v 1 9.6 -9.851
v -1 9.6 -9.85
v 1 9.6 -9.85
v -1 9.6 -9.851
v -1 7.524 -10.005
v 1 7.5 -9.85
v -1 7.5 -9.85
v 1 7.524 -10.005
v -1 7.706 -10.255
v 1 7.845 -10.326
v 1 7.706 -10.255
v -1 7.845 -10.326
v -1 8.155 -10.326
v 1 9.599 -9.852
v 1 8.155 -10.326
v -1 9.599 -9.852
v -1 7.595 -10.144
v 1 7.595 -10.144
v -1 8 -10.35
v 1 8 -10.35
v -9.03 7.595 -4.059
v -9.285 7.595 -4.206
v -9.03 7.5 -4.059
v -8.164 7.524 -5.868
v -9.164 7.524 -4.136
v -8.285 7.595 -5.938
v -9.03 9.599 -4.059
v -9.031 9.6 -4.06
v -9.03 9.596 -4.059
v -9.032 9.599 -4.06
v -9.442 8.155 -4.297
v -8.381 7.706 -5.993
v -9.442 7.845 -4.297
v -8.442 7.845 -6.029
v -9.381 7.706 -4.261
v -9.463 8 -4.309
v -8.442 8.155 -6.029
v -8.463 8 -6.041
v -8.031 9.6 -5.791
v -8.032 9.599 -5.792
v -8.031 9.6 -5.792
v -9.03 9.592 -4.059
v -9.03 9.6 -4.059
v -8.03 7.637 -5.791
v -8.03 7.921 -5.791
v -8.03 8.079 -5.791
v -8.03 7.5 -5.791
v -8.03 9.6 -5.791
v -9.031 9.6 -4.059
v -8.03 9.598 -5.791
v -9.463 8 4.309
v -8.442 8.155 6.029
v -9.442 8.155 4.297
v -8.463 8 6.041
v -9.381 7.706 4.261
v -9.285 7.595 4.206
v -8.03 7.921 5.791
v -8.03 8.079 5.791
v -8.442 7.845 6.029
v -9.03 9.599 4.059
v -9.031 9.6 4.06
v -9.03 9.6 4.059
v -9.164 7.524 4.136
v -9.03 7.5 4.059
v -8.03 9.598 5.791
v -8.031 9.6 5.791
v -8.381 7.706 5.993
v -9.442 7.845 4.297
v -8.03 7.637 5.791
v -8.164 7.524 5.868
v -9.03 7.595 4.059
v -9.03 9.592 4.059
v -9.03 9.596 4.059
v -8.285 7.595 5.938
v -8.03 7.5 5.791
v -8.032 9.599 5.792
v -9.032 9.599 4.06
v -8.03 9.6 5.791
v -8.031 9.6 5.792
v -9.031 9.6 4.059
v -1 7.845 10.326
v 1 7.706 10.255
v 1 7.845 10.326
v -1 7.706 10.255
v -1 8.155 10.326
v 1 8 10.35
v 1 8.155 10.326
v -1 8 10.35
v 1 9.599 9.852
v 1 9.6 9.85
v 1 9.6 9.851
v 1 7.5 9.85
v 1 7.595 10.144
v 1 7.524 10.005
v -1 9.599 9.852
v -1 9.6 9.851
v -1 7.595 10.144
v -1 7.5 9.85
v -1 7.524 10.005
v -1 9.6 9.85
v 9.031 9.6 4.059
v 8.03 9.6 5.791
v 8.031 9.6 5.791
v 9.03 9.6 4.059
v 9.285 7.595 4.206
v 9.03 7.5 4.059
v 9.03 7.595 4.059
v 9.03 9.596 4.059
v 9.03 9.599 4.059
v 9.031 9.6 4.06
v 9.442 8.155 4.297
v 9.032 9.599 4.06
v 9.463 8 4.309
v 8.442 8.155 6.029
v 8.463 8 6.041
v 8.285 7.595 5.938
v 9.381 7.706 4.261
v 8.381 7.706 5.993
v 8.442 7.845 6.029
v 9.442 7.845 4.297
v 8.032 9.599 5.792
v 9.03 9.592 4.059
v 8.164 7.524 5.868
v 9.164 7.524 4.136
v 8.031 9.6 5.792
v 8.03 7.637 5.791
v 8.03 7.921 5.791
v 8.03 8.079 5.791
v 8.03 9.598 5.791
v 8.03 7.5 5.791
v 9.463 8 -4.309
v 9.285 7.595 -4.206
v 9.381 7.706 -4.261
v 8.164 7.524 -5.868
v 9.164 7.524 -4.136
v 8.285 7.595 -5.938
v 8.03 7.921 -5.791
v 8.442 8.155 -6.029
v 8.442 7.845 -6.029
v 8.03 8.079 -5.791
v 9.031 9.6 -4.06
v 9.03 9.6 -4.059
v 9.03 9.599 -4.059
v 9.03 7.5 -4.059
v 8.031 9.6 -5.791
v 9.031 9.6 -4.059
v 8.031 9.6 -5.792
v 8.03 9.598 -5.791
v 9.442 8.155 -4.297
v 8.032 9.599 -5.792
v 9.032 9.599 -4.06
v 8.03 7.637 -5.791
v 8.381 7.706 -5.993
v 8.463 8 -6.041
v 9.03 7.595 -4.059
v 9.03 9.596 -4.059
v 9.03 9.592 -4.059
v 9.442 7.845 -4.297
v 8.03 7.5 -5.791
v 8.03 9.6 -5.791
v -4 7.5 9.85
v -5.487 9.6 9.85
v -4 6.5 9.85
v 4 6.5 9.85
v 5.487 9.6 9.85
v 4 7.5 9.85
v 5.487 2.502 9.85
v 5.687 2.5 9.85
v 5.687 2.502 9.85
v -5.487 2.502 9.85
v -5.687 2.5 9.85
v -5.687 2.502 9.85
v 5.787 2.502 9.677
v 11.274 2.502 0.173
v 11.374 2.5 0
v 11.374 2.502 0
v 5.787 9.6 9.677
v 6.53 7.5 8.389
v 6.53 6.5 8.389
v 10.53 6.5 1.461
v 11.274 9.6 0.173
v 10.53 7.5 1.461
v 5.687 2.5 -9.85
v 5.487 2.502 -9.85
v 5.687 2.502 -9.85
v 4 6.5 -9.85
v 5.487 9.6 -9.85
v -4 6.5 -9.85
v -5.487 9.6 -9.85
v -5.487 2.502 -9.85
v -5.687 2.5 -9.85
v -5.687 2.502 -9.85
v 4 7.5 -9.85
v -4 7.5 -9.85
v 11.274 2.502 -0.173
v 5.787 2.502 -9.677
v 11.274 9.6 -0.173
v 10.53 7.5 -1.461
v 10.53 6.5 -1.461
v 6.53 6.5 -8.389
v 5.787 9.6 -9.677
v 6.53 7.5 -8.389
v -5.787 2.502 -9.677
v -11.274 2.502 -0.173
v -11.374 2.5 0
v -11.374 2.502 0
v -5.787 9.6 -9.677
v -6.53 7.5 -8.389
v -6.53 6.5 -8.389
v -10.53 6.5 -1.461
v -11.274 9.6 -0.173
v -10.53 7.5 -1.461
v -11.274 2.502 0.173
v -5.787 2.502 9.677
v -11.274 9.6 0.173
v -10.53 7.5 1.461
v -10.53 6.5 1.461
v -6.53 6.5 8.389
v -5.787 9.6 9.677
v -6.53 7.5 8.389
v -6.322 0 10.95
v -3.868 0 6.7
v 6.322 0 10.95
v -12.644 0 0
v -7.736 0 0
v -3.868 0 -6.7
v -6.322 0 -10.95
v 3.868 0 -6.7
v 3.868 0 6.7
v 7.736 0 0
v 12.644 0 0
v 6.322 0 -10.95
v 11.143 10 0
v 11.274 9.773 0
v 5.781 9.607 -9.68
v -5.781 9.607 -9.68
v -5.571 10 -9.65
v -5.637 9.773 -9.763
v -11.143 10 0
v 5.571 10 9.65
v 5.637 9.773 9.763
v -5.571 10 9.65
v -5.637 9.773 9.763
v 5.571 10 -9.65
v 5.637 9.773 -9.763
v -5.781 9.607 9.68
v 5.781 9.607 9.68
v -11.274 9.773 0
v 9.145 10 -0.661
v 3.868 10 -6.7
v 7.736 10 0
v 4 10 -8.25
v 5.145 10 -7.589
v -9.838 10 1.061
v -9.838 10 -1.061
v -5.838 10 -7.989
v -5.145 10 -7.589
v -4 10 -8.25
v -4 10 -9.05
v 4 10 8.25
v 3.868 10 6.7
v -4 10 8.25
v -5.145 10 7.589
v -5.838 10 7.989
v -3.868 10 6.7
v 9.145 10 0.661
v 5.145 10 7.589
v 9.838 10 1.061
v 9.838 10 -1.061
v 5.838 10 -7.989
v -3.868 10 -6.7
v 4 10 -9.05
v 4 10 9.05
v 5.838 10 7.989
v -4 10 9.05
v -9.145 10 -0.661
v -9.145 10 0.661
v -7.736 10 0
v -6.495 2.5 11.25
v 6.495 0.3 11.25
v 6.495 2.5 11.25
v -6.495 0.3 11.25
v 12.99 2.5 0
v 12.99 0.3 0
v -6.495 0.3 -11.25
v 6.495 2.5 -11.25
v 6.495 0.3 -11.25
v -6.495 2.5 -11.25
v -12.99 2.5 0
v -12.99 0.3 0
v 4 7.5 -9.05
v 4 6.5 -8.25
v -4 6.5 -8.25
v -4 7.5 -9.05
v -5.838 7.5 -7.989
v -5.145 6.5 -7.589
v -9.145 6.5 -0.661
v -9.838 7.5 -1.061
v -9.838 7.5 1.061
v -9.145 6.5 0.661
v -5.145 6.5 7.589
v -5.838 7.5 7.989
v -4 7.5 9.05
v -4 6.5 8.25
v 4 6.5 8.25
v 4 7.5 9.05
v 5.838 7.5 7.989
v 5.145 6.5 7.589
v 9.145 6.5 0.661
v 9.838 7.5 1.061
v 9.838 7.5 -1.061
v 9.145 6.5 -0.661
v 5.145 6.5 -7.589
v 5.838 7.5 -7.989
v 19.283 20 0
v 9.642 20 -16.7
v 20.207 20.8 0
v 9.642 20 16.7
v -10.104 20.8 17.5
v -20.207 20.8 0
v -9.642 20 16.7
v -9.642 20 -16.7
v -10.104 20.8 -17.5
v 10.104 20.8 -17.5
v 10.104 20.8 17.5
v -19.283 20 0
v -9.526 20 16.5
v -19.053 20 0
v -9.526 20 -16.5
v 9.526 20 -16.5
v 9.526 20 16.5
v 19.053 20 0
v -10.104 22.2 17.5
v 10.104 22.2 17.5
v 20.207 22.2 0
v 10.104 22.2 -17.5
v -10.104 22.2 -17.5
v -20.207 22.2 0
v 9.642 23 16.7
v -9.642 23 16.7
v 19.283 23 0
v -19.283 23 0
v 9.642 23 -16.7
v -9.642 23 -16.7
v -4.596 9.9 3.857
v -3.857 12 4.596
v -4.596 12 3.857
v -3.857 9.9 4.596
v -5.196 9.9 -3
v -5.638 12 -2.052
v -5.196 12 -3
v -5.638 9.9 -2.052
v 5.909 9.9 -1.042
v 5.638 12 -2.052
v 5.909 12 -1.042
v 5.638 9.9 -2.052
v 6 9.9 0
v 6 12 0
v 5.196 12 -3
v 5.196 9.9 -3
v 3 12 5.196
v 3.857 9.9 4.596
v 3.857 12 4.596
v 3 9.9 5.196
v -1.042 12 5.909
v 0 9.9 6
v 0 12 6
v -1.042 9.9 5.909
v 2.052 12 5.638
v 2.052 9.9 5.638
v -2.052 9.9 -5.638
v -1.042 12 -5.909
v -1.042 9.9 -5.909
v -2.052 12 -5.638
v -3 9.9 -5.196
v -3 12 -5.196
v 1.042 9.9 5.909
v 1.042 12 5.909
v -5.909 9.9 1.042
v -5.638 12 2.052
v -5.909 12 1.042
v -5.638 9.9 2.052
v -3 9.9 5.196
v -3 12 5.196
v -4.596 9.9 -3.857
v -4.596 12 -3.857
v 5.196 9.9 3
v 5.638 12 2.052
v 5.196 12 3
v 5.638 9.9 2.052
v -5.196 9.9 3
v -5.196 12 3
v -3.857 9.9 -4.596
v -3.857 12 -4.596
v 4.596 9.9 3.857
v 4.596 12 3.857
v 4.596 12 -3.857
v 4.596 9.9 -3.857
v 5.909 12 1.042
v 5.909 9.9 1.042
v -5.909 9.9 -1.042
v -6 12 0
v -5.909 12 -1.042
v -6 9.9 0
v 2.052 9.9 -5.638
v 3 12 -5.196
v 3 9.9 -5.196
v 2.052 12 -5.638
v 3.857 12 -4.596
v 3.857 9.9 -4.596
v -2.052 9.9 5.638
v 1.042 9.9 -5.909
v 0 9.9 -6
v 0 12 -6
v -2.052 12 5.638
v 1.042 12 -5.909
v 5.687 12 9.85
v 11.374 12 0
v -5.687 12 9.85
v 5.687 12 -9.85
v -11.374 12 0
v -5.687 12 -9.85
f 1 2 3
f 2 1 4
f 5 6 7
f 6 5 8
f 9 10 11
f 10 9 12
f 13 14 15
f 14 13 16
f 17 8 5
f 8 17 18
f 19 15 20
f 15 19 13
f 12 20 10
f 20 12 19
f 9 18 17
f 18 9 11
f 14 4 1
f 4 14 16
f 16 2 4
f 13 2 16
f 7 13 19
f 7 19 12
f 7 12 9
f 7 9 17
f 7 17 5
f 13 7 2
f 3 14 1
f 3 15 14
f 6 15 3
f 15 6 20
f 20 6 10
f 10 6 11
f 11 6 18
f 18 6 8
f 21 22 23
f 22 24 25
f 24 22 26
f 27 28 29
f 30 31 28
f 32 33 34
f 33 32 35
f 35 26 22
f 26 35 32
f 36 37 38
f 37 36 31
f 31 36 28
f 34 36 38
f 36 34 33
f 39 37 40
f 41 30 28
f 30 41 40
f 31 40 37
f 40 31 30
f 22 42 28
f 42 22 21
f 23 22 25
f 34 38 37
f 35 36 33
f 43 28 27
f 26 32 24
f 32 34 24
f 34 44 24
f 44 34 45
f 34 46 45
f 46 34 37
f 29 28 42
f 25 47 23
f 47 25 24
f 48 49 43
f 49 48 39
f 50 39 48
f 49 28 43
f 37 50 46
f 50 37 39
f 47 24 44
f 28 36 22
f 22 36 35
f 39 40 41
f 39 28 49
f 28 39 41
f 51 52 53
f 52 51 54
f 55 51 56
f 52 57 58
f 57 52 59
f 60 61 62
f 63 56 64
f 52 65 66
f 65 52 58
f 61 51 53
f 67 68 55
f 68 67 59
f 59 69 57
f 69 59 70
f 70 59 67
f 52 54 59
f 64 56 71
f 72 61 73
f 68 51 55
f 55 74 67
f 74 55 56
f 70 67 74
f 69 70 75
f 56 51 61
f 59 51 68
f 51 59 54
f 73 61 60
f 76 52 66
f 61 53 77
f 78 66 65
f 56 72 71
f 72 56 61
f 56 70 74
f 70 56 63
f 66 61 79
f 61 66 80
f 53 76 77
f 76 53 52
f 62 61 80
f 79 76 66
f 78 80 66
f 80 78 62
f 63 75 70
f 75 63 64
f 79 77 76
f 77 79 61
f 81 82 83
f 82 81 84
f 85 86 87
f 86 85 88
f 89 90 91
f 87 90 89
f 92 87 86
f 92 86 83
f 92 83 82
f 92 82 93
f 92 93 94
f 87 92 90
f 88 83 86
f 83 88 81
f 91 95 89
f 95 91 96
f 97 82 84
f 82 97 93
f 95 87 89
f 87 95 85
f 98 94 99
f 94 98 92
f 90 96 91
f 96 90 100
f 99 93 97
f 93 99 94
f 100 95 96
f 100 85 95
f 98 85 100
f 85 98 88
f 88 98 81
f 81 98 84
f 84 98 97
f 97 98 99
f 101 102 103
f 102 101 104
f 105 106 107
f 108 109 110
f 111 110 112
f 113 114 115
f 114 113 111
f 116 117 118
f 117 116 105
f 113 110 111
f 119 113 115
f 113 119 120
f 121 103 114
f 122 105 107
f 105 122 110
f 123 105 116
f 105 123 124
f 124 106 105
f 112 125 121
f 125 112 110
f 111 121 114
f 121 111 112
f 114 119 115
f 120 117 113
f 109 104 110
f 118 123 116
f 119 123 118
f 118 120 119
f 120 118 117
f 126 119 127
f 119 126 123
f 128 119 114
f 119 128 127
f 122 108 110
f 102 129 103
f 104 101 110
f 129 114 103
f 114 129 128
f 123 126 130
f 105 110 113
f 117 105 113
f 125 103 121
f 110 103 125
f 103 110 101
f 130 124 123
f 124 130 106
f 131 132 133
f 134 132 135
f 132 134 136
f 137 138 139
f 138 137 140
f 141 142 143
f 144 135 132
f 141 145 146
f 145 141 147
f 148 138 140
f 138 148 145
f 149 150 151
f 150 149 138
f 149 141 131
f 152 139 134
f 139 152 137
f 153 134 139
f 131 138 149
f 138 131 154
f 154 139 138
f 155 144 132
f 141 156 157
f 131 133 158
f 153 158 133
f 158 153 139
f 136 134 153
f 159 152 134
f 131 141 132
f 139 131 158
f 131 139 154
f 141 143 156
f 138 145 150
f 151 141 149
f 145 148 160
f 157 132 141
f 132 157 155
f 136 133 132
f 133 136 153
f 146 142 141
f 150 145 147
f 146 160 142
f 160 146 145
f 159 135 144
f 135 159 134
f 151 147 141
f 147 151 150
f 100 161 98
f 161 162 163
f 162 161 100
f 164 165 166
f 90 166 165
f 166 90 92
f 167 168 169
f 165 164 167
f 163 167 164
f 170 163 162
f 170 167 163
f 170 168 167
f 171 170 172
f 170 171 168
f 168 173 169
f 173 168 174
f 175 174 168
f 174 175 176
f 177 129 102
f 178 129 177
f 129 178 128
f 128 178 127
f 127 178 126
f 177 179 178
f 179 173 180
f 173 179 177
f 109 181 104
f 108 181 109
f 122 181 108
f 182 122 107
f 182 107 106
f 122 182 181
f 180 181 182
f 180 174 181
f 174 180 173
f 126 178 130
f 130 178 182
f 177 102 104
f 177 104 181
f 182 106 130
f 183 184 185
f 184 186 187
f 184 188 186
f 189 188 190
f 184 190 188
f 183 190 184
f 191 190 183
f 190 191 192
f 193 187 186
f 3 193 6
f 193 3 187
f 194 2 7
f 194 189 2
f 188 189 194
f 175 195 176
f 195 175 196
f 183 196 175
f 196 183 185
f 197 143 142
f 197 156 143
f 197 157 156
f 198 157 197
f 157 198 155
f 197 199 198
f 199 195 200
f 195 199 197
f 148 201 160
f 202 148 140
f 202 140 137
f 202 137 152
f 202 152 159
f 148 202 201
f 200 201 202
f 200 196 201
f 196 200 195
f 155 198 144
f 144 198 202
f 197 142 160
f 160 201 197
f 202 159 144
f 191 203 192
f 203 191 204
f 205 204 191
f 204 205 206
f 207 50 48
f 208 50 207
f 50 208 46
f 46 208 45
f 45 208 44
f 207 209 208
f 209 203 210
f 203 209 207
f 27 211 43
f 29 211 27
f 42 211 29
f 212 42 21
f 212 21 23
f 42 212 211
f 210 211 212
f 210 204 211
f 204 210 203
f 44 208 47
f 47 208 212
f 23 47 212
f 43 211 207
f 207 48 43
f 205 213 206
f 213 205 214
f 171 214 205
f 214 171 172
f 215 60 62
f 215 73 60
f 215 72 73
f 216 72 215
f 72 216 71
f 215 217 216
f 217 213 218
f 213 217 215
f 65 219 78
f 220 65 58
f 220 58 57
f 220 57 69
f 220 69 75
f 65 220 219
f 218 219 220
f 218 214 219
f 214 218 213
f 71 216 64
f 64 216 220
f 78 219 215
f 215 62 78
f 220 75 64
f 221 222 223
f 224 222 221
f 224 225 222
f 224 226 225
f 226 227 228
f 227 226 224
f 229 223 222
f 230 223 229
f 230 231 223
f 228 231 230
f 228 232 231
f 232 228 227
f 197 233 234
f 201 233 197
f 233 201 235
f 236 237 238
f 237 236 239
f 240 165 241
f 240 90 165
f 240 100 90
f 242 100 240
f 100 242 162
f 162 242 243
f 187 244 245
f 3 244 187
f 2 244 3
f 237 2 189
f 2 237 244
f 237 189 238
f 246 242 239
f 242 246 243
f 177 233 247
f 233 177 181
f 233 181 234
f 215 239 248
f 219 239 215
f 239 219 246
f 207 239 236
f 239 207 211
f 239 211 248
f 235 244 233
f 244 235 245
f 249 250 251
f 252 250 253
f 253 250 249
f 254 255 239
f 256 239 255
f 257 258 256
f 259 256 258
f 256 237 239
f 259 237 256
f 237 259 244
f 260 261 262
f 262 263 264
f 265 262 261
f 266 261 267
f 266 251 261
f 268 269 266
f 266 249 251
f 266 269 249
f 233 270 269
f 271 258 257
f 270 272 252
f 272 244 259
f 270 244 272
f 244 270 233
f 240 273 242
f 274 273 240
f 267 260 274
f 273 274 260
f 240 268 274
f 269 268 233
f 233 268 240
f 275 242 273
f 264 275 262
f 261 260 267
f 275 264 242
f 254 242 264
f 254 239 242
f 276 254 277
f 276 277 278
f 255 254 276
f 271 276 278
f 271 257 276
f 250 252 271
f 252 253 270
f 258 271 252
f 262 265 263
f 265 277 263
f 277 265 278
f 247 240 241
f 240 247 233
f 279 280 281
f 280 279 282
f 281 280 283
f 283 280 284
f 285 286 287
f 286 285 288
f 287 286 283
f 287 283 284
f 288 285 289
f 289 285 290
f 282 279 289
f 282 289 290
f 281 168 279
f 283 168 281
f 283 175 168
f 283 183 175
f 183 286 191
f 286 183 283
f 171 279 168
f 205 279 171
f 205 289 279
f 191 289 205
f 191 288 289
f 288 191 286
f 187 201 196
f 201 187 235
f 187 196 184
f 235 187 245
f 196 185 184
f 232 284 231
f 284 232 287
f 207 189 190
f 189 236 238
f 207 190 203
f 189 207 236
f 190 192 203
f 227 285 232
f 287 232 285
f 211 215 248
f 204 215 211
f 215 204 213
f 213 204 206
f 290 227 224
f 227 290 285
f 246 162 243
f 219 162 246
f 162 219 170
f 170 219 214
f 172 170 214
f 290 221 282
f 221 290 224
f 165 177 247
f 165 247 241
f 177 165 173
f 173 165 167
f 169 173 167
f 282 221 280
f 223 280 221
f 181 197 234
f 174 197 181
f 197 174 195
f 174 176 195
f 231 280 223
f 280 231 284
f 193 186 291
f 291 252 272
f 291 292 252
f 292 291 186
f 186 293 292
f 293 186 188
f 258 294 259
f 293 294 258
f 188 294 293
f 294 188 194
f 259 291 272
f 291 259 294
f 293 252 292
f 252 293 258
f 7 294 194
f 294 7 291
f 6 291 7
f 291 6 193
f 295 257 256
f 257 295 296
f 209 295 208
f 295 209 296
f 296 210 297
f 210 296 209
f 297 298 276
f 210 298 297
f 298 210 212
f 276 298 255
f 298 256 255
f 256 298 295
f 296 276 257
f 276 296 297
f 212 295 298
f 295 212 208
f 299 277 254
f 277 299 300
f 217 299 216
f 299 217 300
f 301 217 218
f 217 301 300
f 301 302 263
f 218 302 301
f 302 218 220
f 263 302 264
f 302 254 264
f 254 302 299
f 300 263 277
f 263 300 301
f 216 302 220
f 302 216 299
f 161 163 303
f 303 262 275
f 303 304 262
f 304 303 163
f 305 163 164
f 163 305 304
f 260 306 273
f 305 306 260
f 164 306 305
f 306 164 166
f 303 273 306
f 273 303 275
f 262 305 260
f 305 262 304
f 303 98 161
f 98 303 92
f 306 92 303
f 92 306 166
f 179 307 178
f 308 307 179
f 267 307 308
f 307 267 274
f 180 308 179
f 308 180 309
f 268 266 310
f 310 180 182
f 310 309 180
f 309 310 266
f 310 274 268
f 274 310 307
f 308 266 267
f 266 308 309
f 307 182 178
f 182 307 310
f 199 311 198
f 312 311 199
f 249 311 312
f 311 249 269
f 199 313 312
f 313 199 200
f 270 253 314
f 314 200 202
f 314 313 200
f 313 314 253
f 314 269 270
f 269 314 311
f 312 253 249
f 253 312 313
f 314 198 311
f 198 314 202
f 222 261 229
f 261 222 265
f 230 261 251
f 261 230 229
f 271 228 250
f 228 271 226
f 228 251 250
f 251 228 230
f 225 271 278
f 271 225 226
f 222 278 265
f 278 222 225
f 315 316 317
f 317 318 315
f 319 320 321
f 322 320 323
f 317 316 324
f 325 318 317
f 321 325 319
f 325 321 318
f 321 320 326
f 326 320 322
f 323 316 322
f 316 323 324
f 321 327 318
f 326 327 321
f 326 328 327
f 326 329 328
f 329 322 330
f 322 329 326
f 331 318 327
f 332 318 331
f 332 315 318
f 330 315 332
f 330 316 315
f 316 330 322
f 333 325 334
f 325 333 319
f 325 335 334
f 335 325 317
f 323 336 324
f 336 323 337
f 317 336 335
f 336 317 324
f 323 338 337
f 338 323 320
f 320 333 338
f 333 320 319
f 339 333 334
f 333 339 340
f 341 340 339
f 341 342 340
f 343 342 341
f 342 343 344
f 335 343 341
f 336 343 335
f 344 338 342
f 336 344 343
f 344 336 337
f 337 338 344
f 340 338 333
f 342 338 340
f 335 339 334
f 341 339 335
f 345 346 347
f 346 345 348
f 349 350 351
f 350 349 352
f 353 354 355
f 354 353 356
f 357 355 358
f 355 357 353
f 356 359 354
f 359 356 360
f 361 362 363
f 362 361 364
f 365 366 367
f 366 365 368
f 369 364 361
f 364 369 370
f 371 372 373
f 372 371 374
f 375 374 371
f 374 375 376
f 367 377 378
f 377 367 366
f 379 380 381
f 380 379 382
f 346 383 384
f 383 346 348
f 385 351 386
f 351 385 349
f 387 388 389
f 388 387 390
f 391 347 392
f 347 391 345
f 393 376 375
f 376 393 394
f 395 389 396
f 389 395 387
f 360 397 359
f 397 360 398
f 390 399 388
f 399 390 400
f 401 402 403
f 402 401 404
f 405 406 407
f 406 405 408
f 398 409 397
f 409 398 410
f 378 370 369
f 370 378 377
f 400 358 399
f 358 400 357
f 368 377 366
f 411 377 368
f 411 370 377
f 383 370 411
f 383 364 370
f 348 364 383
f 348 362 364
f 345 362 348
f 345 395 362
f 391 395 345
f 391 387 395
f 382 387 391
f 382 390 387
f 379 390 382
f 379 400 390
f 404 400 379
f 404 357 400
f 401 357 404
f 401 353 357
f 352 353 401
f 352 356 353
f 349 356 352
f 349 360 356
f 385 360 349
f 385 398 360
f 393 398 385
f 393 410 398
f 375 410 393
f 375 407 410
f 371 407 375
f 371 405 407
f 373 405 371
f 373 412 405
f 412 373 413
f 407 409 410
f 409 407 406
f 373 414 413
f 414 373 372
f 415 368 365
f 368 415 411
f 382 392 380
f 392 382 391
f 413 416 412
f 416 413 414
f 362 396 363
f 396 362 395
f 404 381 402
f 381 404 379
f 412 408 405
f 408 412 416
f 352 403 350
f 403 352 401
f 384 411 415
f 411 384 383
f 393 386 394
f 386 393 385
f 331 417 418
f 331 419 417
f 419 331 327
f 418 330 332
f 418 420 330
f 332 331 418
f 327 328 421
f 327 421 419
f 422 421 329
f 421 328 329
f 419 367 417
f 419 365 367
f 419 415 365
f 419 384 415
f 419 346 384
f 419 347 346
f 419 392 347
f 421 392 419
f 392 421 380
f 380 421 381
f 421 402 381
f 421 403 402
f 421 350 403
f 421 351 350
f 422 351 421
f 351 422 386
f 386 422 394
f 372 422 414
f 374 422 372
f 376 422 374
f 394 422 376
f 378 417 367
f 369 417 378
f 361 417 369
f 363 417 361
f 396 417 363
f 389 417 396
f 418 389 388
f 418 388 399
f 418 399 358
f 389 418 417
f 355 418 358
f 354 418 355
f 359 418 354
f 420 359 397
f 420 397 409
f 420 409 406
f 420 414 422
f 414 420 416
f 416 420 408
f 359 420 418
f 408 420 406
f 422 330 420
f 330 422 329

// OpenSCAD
// file: ../Library/hws_openscad_attachments_and_connectors.scad
// MIT-licensed source from:
// https://github.com/neclimdul/hws_openscad_attachments_and_connectors

include <hws_insert_util.scad>

module insert_plug_adv(structure, tolerance = 0, decoration = true)
{
    for (y_pos = [0:len(structure) - 1])
    {
        for (x_pos = [0:len(structure[y_pos]) - 1])
        {
            if (structure[y_pos][x_pos] != 0)
            {
                _draw_insert(structure, x_pos, y_pos, tolerance, decorate = decoration);
            }
        }
    }
}
// main file
use <../Library/hws_openscad_attachments_and_connectors.scad>

/* [Spacer Dimensions] */
HEX_ACROSS_FLATS = 35;
FRONT_PLATE_THICKNESS = 3;
STANDOFF_DISTANCE = 18;
HWS_BODY_ACROSS_FLATS = 19.7;
HWS_CONNECTOR_TOLERANCE = 0;
NECK_DIAMETER = 12;
NECK_LENGTH = 2;

// The HWS insert extends from the wall in +Y.  Neck length extends the total
// stand-off without shortening the tapered spacer section.
HWS_INSERT_DEPTH = 10;
BODY_START = HWS_INSERT_DEPTH + NECK_LENGTH;
BODY_DEPTH = max(1, STANDOFF_DISTANCE - HWS_INSERT_DEPTH);
FRONT_PLATE_POSITION = BODY_START + BODY_DEPTH;
PLATE_BEVEL = min(0.8, FRONT_PLATE_THICKNESS / 3);

module hex_prism(across_flats, depth)
{
	rotate([ -90, 0, 0 ])
		cylinder(d = across_flats * 2 / sqrt(3), h = depth, $fn = 6);
}

module hex_frustum(rear_across_flats, front_across_flats, depth)
{
	rotate([ -90, 0, 0 ])
		cylinder(
			d1 = rear_across_flats * 2 / sqrt(3),
			d2 = front_across_flats * 2 / sqrt(3),
			h = depth,
			$fn = 6
		);
}

module front_plate()
{
	translate([ 0, FRONT_PLATE_POSITION, 0 ])
		union()
		{
			hex_frustum(HEX_ACROSS_FLATS - 2 * PLATE_BEVEL, HEX_ACROSS_FLATS, PLATE_BEVEL);
			translate([ 0, PLATE_BEVEL, 0 ])
				hex_prism(HEX_ACROSS_FLATS, FRONT_PLATE_THICKNESS - 2 * PLATE_BEVEL);
			translate([ 0, FRONT_PLATE_THICKNESS - PLATE_BEVEL, 0 ])
				hex_frustum(HEX_ACROSS_FLATS, HEX_ACROSS_FLATS - 2 * PLATE_BEVEL, PLATE_BEVEL);
		}
}

module spacer_body()
{
	translate([ 0, BODY_START, 0 ])
		hex_frustum(HWS_BODY_ACROSS_FLATS, HEX_ACROSS_FLATS - 2, BODY_DEPTH);
}

module connector_neck()
{
	translate([ 0, HWS_INSERT_DEPTH - 0.1, 0 ])
		rotate([ -90, 0, 0 ])
			cylinder(d = NECK_DIAMETER, h = NECK_LENGTH + 0.2, $fn = 36);
}

module hws_connector()
{
	rotate([ -90, 0, 0 ])
		insert_plug_adv([[1]], tolerance = HWS_CONNECTOR_TOLERANCE, decoration = false);
}

union()
{
	hws_connector();
	connector_neck();
	spacer_body();
	front_plate();
}
